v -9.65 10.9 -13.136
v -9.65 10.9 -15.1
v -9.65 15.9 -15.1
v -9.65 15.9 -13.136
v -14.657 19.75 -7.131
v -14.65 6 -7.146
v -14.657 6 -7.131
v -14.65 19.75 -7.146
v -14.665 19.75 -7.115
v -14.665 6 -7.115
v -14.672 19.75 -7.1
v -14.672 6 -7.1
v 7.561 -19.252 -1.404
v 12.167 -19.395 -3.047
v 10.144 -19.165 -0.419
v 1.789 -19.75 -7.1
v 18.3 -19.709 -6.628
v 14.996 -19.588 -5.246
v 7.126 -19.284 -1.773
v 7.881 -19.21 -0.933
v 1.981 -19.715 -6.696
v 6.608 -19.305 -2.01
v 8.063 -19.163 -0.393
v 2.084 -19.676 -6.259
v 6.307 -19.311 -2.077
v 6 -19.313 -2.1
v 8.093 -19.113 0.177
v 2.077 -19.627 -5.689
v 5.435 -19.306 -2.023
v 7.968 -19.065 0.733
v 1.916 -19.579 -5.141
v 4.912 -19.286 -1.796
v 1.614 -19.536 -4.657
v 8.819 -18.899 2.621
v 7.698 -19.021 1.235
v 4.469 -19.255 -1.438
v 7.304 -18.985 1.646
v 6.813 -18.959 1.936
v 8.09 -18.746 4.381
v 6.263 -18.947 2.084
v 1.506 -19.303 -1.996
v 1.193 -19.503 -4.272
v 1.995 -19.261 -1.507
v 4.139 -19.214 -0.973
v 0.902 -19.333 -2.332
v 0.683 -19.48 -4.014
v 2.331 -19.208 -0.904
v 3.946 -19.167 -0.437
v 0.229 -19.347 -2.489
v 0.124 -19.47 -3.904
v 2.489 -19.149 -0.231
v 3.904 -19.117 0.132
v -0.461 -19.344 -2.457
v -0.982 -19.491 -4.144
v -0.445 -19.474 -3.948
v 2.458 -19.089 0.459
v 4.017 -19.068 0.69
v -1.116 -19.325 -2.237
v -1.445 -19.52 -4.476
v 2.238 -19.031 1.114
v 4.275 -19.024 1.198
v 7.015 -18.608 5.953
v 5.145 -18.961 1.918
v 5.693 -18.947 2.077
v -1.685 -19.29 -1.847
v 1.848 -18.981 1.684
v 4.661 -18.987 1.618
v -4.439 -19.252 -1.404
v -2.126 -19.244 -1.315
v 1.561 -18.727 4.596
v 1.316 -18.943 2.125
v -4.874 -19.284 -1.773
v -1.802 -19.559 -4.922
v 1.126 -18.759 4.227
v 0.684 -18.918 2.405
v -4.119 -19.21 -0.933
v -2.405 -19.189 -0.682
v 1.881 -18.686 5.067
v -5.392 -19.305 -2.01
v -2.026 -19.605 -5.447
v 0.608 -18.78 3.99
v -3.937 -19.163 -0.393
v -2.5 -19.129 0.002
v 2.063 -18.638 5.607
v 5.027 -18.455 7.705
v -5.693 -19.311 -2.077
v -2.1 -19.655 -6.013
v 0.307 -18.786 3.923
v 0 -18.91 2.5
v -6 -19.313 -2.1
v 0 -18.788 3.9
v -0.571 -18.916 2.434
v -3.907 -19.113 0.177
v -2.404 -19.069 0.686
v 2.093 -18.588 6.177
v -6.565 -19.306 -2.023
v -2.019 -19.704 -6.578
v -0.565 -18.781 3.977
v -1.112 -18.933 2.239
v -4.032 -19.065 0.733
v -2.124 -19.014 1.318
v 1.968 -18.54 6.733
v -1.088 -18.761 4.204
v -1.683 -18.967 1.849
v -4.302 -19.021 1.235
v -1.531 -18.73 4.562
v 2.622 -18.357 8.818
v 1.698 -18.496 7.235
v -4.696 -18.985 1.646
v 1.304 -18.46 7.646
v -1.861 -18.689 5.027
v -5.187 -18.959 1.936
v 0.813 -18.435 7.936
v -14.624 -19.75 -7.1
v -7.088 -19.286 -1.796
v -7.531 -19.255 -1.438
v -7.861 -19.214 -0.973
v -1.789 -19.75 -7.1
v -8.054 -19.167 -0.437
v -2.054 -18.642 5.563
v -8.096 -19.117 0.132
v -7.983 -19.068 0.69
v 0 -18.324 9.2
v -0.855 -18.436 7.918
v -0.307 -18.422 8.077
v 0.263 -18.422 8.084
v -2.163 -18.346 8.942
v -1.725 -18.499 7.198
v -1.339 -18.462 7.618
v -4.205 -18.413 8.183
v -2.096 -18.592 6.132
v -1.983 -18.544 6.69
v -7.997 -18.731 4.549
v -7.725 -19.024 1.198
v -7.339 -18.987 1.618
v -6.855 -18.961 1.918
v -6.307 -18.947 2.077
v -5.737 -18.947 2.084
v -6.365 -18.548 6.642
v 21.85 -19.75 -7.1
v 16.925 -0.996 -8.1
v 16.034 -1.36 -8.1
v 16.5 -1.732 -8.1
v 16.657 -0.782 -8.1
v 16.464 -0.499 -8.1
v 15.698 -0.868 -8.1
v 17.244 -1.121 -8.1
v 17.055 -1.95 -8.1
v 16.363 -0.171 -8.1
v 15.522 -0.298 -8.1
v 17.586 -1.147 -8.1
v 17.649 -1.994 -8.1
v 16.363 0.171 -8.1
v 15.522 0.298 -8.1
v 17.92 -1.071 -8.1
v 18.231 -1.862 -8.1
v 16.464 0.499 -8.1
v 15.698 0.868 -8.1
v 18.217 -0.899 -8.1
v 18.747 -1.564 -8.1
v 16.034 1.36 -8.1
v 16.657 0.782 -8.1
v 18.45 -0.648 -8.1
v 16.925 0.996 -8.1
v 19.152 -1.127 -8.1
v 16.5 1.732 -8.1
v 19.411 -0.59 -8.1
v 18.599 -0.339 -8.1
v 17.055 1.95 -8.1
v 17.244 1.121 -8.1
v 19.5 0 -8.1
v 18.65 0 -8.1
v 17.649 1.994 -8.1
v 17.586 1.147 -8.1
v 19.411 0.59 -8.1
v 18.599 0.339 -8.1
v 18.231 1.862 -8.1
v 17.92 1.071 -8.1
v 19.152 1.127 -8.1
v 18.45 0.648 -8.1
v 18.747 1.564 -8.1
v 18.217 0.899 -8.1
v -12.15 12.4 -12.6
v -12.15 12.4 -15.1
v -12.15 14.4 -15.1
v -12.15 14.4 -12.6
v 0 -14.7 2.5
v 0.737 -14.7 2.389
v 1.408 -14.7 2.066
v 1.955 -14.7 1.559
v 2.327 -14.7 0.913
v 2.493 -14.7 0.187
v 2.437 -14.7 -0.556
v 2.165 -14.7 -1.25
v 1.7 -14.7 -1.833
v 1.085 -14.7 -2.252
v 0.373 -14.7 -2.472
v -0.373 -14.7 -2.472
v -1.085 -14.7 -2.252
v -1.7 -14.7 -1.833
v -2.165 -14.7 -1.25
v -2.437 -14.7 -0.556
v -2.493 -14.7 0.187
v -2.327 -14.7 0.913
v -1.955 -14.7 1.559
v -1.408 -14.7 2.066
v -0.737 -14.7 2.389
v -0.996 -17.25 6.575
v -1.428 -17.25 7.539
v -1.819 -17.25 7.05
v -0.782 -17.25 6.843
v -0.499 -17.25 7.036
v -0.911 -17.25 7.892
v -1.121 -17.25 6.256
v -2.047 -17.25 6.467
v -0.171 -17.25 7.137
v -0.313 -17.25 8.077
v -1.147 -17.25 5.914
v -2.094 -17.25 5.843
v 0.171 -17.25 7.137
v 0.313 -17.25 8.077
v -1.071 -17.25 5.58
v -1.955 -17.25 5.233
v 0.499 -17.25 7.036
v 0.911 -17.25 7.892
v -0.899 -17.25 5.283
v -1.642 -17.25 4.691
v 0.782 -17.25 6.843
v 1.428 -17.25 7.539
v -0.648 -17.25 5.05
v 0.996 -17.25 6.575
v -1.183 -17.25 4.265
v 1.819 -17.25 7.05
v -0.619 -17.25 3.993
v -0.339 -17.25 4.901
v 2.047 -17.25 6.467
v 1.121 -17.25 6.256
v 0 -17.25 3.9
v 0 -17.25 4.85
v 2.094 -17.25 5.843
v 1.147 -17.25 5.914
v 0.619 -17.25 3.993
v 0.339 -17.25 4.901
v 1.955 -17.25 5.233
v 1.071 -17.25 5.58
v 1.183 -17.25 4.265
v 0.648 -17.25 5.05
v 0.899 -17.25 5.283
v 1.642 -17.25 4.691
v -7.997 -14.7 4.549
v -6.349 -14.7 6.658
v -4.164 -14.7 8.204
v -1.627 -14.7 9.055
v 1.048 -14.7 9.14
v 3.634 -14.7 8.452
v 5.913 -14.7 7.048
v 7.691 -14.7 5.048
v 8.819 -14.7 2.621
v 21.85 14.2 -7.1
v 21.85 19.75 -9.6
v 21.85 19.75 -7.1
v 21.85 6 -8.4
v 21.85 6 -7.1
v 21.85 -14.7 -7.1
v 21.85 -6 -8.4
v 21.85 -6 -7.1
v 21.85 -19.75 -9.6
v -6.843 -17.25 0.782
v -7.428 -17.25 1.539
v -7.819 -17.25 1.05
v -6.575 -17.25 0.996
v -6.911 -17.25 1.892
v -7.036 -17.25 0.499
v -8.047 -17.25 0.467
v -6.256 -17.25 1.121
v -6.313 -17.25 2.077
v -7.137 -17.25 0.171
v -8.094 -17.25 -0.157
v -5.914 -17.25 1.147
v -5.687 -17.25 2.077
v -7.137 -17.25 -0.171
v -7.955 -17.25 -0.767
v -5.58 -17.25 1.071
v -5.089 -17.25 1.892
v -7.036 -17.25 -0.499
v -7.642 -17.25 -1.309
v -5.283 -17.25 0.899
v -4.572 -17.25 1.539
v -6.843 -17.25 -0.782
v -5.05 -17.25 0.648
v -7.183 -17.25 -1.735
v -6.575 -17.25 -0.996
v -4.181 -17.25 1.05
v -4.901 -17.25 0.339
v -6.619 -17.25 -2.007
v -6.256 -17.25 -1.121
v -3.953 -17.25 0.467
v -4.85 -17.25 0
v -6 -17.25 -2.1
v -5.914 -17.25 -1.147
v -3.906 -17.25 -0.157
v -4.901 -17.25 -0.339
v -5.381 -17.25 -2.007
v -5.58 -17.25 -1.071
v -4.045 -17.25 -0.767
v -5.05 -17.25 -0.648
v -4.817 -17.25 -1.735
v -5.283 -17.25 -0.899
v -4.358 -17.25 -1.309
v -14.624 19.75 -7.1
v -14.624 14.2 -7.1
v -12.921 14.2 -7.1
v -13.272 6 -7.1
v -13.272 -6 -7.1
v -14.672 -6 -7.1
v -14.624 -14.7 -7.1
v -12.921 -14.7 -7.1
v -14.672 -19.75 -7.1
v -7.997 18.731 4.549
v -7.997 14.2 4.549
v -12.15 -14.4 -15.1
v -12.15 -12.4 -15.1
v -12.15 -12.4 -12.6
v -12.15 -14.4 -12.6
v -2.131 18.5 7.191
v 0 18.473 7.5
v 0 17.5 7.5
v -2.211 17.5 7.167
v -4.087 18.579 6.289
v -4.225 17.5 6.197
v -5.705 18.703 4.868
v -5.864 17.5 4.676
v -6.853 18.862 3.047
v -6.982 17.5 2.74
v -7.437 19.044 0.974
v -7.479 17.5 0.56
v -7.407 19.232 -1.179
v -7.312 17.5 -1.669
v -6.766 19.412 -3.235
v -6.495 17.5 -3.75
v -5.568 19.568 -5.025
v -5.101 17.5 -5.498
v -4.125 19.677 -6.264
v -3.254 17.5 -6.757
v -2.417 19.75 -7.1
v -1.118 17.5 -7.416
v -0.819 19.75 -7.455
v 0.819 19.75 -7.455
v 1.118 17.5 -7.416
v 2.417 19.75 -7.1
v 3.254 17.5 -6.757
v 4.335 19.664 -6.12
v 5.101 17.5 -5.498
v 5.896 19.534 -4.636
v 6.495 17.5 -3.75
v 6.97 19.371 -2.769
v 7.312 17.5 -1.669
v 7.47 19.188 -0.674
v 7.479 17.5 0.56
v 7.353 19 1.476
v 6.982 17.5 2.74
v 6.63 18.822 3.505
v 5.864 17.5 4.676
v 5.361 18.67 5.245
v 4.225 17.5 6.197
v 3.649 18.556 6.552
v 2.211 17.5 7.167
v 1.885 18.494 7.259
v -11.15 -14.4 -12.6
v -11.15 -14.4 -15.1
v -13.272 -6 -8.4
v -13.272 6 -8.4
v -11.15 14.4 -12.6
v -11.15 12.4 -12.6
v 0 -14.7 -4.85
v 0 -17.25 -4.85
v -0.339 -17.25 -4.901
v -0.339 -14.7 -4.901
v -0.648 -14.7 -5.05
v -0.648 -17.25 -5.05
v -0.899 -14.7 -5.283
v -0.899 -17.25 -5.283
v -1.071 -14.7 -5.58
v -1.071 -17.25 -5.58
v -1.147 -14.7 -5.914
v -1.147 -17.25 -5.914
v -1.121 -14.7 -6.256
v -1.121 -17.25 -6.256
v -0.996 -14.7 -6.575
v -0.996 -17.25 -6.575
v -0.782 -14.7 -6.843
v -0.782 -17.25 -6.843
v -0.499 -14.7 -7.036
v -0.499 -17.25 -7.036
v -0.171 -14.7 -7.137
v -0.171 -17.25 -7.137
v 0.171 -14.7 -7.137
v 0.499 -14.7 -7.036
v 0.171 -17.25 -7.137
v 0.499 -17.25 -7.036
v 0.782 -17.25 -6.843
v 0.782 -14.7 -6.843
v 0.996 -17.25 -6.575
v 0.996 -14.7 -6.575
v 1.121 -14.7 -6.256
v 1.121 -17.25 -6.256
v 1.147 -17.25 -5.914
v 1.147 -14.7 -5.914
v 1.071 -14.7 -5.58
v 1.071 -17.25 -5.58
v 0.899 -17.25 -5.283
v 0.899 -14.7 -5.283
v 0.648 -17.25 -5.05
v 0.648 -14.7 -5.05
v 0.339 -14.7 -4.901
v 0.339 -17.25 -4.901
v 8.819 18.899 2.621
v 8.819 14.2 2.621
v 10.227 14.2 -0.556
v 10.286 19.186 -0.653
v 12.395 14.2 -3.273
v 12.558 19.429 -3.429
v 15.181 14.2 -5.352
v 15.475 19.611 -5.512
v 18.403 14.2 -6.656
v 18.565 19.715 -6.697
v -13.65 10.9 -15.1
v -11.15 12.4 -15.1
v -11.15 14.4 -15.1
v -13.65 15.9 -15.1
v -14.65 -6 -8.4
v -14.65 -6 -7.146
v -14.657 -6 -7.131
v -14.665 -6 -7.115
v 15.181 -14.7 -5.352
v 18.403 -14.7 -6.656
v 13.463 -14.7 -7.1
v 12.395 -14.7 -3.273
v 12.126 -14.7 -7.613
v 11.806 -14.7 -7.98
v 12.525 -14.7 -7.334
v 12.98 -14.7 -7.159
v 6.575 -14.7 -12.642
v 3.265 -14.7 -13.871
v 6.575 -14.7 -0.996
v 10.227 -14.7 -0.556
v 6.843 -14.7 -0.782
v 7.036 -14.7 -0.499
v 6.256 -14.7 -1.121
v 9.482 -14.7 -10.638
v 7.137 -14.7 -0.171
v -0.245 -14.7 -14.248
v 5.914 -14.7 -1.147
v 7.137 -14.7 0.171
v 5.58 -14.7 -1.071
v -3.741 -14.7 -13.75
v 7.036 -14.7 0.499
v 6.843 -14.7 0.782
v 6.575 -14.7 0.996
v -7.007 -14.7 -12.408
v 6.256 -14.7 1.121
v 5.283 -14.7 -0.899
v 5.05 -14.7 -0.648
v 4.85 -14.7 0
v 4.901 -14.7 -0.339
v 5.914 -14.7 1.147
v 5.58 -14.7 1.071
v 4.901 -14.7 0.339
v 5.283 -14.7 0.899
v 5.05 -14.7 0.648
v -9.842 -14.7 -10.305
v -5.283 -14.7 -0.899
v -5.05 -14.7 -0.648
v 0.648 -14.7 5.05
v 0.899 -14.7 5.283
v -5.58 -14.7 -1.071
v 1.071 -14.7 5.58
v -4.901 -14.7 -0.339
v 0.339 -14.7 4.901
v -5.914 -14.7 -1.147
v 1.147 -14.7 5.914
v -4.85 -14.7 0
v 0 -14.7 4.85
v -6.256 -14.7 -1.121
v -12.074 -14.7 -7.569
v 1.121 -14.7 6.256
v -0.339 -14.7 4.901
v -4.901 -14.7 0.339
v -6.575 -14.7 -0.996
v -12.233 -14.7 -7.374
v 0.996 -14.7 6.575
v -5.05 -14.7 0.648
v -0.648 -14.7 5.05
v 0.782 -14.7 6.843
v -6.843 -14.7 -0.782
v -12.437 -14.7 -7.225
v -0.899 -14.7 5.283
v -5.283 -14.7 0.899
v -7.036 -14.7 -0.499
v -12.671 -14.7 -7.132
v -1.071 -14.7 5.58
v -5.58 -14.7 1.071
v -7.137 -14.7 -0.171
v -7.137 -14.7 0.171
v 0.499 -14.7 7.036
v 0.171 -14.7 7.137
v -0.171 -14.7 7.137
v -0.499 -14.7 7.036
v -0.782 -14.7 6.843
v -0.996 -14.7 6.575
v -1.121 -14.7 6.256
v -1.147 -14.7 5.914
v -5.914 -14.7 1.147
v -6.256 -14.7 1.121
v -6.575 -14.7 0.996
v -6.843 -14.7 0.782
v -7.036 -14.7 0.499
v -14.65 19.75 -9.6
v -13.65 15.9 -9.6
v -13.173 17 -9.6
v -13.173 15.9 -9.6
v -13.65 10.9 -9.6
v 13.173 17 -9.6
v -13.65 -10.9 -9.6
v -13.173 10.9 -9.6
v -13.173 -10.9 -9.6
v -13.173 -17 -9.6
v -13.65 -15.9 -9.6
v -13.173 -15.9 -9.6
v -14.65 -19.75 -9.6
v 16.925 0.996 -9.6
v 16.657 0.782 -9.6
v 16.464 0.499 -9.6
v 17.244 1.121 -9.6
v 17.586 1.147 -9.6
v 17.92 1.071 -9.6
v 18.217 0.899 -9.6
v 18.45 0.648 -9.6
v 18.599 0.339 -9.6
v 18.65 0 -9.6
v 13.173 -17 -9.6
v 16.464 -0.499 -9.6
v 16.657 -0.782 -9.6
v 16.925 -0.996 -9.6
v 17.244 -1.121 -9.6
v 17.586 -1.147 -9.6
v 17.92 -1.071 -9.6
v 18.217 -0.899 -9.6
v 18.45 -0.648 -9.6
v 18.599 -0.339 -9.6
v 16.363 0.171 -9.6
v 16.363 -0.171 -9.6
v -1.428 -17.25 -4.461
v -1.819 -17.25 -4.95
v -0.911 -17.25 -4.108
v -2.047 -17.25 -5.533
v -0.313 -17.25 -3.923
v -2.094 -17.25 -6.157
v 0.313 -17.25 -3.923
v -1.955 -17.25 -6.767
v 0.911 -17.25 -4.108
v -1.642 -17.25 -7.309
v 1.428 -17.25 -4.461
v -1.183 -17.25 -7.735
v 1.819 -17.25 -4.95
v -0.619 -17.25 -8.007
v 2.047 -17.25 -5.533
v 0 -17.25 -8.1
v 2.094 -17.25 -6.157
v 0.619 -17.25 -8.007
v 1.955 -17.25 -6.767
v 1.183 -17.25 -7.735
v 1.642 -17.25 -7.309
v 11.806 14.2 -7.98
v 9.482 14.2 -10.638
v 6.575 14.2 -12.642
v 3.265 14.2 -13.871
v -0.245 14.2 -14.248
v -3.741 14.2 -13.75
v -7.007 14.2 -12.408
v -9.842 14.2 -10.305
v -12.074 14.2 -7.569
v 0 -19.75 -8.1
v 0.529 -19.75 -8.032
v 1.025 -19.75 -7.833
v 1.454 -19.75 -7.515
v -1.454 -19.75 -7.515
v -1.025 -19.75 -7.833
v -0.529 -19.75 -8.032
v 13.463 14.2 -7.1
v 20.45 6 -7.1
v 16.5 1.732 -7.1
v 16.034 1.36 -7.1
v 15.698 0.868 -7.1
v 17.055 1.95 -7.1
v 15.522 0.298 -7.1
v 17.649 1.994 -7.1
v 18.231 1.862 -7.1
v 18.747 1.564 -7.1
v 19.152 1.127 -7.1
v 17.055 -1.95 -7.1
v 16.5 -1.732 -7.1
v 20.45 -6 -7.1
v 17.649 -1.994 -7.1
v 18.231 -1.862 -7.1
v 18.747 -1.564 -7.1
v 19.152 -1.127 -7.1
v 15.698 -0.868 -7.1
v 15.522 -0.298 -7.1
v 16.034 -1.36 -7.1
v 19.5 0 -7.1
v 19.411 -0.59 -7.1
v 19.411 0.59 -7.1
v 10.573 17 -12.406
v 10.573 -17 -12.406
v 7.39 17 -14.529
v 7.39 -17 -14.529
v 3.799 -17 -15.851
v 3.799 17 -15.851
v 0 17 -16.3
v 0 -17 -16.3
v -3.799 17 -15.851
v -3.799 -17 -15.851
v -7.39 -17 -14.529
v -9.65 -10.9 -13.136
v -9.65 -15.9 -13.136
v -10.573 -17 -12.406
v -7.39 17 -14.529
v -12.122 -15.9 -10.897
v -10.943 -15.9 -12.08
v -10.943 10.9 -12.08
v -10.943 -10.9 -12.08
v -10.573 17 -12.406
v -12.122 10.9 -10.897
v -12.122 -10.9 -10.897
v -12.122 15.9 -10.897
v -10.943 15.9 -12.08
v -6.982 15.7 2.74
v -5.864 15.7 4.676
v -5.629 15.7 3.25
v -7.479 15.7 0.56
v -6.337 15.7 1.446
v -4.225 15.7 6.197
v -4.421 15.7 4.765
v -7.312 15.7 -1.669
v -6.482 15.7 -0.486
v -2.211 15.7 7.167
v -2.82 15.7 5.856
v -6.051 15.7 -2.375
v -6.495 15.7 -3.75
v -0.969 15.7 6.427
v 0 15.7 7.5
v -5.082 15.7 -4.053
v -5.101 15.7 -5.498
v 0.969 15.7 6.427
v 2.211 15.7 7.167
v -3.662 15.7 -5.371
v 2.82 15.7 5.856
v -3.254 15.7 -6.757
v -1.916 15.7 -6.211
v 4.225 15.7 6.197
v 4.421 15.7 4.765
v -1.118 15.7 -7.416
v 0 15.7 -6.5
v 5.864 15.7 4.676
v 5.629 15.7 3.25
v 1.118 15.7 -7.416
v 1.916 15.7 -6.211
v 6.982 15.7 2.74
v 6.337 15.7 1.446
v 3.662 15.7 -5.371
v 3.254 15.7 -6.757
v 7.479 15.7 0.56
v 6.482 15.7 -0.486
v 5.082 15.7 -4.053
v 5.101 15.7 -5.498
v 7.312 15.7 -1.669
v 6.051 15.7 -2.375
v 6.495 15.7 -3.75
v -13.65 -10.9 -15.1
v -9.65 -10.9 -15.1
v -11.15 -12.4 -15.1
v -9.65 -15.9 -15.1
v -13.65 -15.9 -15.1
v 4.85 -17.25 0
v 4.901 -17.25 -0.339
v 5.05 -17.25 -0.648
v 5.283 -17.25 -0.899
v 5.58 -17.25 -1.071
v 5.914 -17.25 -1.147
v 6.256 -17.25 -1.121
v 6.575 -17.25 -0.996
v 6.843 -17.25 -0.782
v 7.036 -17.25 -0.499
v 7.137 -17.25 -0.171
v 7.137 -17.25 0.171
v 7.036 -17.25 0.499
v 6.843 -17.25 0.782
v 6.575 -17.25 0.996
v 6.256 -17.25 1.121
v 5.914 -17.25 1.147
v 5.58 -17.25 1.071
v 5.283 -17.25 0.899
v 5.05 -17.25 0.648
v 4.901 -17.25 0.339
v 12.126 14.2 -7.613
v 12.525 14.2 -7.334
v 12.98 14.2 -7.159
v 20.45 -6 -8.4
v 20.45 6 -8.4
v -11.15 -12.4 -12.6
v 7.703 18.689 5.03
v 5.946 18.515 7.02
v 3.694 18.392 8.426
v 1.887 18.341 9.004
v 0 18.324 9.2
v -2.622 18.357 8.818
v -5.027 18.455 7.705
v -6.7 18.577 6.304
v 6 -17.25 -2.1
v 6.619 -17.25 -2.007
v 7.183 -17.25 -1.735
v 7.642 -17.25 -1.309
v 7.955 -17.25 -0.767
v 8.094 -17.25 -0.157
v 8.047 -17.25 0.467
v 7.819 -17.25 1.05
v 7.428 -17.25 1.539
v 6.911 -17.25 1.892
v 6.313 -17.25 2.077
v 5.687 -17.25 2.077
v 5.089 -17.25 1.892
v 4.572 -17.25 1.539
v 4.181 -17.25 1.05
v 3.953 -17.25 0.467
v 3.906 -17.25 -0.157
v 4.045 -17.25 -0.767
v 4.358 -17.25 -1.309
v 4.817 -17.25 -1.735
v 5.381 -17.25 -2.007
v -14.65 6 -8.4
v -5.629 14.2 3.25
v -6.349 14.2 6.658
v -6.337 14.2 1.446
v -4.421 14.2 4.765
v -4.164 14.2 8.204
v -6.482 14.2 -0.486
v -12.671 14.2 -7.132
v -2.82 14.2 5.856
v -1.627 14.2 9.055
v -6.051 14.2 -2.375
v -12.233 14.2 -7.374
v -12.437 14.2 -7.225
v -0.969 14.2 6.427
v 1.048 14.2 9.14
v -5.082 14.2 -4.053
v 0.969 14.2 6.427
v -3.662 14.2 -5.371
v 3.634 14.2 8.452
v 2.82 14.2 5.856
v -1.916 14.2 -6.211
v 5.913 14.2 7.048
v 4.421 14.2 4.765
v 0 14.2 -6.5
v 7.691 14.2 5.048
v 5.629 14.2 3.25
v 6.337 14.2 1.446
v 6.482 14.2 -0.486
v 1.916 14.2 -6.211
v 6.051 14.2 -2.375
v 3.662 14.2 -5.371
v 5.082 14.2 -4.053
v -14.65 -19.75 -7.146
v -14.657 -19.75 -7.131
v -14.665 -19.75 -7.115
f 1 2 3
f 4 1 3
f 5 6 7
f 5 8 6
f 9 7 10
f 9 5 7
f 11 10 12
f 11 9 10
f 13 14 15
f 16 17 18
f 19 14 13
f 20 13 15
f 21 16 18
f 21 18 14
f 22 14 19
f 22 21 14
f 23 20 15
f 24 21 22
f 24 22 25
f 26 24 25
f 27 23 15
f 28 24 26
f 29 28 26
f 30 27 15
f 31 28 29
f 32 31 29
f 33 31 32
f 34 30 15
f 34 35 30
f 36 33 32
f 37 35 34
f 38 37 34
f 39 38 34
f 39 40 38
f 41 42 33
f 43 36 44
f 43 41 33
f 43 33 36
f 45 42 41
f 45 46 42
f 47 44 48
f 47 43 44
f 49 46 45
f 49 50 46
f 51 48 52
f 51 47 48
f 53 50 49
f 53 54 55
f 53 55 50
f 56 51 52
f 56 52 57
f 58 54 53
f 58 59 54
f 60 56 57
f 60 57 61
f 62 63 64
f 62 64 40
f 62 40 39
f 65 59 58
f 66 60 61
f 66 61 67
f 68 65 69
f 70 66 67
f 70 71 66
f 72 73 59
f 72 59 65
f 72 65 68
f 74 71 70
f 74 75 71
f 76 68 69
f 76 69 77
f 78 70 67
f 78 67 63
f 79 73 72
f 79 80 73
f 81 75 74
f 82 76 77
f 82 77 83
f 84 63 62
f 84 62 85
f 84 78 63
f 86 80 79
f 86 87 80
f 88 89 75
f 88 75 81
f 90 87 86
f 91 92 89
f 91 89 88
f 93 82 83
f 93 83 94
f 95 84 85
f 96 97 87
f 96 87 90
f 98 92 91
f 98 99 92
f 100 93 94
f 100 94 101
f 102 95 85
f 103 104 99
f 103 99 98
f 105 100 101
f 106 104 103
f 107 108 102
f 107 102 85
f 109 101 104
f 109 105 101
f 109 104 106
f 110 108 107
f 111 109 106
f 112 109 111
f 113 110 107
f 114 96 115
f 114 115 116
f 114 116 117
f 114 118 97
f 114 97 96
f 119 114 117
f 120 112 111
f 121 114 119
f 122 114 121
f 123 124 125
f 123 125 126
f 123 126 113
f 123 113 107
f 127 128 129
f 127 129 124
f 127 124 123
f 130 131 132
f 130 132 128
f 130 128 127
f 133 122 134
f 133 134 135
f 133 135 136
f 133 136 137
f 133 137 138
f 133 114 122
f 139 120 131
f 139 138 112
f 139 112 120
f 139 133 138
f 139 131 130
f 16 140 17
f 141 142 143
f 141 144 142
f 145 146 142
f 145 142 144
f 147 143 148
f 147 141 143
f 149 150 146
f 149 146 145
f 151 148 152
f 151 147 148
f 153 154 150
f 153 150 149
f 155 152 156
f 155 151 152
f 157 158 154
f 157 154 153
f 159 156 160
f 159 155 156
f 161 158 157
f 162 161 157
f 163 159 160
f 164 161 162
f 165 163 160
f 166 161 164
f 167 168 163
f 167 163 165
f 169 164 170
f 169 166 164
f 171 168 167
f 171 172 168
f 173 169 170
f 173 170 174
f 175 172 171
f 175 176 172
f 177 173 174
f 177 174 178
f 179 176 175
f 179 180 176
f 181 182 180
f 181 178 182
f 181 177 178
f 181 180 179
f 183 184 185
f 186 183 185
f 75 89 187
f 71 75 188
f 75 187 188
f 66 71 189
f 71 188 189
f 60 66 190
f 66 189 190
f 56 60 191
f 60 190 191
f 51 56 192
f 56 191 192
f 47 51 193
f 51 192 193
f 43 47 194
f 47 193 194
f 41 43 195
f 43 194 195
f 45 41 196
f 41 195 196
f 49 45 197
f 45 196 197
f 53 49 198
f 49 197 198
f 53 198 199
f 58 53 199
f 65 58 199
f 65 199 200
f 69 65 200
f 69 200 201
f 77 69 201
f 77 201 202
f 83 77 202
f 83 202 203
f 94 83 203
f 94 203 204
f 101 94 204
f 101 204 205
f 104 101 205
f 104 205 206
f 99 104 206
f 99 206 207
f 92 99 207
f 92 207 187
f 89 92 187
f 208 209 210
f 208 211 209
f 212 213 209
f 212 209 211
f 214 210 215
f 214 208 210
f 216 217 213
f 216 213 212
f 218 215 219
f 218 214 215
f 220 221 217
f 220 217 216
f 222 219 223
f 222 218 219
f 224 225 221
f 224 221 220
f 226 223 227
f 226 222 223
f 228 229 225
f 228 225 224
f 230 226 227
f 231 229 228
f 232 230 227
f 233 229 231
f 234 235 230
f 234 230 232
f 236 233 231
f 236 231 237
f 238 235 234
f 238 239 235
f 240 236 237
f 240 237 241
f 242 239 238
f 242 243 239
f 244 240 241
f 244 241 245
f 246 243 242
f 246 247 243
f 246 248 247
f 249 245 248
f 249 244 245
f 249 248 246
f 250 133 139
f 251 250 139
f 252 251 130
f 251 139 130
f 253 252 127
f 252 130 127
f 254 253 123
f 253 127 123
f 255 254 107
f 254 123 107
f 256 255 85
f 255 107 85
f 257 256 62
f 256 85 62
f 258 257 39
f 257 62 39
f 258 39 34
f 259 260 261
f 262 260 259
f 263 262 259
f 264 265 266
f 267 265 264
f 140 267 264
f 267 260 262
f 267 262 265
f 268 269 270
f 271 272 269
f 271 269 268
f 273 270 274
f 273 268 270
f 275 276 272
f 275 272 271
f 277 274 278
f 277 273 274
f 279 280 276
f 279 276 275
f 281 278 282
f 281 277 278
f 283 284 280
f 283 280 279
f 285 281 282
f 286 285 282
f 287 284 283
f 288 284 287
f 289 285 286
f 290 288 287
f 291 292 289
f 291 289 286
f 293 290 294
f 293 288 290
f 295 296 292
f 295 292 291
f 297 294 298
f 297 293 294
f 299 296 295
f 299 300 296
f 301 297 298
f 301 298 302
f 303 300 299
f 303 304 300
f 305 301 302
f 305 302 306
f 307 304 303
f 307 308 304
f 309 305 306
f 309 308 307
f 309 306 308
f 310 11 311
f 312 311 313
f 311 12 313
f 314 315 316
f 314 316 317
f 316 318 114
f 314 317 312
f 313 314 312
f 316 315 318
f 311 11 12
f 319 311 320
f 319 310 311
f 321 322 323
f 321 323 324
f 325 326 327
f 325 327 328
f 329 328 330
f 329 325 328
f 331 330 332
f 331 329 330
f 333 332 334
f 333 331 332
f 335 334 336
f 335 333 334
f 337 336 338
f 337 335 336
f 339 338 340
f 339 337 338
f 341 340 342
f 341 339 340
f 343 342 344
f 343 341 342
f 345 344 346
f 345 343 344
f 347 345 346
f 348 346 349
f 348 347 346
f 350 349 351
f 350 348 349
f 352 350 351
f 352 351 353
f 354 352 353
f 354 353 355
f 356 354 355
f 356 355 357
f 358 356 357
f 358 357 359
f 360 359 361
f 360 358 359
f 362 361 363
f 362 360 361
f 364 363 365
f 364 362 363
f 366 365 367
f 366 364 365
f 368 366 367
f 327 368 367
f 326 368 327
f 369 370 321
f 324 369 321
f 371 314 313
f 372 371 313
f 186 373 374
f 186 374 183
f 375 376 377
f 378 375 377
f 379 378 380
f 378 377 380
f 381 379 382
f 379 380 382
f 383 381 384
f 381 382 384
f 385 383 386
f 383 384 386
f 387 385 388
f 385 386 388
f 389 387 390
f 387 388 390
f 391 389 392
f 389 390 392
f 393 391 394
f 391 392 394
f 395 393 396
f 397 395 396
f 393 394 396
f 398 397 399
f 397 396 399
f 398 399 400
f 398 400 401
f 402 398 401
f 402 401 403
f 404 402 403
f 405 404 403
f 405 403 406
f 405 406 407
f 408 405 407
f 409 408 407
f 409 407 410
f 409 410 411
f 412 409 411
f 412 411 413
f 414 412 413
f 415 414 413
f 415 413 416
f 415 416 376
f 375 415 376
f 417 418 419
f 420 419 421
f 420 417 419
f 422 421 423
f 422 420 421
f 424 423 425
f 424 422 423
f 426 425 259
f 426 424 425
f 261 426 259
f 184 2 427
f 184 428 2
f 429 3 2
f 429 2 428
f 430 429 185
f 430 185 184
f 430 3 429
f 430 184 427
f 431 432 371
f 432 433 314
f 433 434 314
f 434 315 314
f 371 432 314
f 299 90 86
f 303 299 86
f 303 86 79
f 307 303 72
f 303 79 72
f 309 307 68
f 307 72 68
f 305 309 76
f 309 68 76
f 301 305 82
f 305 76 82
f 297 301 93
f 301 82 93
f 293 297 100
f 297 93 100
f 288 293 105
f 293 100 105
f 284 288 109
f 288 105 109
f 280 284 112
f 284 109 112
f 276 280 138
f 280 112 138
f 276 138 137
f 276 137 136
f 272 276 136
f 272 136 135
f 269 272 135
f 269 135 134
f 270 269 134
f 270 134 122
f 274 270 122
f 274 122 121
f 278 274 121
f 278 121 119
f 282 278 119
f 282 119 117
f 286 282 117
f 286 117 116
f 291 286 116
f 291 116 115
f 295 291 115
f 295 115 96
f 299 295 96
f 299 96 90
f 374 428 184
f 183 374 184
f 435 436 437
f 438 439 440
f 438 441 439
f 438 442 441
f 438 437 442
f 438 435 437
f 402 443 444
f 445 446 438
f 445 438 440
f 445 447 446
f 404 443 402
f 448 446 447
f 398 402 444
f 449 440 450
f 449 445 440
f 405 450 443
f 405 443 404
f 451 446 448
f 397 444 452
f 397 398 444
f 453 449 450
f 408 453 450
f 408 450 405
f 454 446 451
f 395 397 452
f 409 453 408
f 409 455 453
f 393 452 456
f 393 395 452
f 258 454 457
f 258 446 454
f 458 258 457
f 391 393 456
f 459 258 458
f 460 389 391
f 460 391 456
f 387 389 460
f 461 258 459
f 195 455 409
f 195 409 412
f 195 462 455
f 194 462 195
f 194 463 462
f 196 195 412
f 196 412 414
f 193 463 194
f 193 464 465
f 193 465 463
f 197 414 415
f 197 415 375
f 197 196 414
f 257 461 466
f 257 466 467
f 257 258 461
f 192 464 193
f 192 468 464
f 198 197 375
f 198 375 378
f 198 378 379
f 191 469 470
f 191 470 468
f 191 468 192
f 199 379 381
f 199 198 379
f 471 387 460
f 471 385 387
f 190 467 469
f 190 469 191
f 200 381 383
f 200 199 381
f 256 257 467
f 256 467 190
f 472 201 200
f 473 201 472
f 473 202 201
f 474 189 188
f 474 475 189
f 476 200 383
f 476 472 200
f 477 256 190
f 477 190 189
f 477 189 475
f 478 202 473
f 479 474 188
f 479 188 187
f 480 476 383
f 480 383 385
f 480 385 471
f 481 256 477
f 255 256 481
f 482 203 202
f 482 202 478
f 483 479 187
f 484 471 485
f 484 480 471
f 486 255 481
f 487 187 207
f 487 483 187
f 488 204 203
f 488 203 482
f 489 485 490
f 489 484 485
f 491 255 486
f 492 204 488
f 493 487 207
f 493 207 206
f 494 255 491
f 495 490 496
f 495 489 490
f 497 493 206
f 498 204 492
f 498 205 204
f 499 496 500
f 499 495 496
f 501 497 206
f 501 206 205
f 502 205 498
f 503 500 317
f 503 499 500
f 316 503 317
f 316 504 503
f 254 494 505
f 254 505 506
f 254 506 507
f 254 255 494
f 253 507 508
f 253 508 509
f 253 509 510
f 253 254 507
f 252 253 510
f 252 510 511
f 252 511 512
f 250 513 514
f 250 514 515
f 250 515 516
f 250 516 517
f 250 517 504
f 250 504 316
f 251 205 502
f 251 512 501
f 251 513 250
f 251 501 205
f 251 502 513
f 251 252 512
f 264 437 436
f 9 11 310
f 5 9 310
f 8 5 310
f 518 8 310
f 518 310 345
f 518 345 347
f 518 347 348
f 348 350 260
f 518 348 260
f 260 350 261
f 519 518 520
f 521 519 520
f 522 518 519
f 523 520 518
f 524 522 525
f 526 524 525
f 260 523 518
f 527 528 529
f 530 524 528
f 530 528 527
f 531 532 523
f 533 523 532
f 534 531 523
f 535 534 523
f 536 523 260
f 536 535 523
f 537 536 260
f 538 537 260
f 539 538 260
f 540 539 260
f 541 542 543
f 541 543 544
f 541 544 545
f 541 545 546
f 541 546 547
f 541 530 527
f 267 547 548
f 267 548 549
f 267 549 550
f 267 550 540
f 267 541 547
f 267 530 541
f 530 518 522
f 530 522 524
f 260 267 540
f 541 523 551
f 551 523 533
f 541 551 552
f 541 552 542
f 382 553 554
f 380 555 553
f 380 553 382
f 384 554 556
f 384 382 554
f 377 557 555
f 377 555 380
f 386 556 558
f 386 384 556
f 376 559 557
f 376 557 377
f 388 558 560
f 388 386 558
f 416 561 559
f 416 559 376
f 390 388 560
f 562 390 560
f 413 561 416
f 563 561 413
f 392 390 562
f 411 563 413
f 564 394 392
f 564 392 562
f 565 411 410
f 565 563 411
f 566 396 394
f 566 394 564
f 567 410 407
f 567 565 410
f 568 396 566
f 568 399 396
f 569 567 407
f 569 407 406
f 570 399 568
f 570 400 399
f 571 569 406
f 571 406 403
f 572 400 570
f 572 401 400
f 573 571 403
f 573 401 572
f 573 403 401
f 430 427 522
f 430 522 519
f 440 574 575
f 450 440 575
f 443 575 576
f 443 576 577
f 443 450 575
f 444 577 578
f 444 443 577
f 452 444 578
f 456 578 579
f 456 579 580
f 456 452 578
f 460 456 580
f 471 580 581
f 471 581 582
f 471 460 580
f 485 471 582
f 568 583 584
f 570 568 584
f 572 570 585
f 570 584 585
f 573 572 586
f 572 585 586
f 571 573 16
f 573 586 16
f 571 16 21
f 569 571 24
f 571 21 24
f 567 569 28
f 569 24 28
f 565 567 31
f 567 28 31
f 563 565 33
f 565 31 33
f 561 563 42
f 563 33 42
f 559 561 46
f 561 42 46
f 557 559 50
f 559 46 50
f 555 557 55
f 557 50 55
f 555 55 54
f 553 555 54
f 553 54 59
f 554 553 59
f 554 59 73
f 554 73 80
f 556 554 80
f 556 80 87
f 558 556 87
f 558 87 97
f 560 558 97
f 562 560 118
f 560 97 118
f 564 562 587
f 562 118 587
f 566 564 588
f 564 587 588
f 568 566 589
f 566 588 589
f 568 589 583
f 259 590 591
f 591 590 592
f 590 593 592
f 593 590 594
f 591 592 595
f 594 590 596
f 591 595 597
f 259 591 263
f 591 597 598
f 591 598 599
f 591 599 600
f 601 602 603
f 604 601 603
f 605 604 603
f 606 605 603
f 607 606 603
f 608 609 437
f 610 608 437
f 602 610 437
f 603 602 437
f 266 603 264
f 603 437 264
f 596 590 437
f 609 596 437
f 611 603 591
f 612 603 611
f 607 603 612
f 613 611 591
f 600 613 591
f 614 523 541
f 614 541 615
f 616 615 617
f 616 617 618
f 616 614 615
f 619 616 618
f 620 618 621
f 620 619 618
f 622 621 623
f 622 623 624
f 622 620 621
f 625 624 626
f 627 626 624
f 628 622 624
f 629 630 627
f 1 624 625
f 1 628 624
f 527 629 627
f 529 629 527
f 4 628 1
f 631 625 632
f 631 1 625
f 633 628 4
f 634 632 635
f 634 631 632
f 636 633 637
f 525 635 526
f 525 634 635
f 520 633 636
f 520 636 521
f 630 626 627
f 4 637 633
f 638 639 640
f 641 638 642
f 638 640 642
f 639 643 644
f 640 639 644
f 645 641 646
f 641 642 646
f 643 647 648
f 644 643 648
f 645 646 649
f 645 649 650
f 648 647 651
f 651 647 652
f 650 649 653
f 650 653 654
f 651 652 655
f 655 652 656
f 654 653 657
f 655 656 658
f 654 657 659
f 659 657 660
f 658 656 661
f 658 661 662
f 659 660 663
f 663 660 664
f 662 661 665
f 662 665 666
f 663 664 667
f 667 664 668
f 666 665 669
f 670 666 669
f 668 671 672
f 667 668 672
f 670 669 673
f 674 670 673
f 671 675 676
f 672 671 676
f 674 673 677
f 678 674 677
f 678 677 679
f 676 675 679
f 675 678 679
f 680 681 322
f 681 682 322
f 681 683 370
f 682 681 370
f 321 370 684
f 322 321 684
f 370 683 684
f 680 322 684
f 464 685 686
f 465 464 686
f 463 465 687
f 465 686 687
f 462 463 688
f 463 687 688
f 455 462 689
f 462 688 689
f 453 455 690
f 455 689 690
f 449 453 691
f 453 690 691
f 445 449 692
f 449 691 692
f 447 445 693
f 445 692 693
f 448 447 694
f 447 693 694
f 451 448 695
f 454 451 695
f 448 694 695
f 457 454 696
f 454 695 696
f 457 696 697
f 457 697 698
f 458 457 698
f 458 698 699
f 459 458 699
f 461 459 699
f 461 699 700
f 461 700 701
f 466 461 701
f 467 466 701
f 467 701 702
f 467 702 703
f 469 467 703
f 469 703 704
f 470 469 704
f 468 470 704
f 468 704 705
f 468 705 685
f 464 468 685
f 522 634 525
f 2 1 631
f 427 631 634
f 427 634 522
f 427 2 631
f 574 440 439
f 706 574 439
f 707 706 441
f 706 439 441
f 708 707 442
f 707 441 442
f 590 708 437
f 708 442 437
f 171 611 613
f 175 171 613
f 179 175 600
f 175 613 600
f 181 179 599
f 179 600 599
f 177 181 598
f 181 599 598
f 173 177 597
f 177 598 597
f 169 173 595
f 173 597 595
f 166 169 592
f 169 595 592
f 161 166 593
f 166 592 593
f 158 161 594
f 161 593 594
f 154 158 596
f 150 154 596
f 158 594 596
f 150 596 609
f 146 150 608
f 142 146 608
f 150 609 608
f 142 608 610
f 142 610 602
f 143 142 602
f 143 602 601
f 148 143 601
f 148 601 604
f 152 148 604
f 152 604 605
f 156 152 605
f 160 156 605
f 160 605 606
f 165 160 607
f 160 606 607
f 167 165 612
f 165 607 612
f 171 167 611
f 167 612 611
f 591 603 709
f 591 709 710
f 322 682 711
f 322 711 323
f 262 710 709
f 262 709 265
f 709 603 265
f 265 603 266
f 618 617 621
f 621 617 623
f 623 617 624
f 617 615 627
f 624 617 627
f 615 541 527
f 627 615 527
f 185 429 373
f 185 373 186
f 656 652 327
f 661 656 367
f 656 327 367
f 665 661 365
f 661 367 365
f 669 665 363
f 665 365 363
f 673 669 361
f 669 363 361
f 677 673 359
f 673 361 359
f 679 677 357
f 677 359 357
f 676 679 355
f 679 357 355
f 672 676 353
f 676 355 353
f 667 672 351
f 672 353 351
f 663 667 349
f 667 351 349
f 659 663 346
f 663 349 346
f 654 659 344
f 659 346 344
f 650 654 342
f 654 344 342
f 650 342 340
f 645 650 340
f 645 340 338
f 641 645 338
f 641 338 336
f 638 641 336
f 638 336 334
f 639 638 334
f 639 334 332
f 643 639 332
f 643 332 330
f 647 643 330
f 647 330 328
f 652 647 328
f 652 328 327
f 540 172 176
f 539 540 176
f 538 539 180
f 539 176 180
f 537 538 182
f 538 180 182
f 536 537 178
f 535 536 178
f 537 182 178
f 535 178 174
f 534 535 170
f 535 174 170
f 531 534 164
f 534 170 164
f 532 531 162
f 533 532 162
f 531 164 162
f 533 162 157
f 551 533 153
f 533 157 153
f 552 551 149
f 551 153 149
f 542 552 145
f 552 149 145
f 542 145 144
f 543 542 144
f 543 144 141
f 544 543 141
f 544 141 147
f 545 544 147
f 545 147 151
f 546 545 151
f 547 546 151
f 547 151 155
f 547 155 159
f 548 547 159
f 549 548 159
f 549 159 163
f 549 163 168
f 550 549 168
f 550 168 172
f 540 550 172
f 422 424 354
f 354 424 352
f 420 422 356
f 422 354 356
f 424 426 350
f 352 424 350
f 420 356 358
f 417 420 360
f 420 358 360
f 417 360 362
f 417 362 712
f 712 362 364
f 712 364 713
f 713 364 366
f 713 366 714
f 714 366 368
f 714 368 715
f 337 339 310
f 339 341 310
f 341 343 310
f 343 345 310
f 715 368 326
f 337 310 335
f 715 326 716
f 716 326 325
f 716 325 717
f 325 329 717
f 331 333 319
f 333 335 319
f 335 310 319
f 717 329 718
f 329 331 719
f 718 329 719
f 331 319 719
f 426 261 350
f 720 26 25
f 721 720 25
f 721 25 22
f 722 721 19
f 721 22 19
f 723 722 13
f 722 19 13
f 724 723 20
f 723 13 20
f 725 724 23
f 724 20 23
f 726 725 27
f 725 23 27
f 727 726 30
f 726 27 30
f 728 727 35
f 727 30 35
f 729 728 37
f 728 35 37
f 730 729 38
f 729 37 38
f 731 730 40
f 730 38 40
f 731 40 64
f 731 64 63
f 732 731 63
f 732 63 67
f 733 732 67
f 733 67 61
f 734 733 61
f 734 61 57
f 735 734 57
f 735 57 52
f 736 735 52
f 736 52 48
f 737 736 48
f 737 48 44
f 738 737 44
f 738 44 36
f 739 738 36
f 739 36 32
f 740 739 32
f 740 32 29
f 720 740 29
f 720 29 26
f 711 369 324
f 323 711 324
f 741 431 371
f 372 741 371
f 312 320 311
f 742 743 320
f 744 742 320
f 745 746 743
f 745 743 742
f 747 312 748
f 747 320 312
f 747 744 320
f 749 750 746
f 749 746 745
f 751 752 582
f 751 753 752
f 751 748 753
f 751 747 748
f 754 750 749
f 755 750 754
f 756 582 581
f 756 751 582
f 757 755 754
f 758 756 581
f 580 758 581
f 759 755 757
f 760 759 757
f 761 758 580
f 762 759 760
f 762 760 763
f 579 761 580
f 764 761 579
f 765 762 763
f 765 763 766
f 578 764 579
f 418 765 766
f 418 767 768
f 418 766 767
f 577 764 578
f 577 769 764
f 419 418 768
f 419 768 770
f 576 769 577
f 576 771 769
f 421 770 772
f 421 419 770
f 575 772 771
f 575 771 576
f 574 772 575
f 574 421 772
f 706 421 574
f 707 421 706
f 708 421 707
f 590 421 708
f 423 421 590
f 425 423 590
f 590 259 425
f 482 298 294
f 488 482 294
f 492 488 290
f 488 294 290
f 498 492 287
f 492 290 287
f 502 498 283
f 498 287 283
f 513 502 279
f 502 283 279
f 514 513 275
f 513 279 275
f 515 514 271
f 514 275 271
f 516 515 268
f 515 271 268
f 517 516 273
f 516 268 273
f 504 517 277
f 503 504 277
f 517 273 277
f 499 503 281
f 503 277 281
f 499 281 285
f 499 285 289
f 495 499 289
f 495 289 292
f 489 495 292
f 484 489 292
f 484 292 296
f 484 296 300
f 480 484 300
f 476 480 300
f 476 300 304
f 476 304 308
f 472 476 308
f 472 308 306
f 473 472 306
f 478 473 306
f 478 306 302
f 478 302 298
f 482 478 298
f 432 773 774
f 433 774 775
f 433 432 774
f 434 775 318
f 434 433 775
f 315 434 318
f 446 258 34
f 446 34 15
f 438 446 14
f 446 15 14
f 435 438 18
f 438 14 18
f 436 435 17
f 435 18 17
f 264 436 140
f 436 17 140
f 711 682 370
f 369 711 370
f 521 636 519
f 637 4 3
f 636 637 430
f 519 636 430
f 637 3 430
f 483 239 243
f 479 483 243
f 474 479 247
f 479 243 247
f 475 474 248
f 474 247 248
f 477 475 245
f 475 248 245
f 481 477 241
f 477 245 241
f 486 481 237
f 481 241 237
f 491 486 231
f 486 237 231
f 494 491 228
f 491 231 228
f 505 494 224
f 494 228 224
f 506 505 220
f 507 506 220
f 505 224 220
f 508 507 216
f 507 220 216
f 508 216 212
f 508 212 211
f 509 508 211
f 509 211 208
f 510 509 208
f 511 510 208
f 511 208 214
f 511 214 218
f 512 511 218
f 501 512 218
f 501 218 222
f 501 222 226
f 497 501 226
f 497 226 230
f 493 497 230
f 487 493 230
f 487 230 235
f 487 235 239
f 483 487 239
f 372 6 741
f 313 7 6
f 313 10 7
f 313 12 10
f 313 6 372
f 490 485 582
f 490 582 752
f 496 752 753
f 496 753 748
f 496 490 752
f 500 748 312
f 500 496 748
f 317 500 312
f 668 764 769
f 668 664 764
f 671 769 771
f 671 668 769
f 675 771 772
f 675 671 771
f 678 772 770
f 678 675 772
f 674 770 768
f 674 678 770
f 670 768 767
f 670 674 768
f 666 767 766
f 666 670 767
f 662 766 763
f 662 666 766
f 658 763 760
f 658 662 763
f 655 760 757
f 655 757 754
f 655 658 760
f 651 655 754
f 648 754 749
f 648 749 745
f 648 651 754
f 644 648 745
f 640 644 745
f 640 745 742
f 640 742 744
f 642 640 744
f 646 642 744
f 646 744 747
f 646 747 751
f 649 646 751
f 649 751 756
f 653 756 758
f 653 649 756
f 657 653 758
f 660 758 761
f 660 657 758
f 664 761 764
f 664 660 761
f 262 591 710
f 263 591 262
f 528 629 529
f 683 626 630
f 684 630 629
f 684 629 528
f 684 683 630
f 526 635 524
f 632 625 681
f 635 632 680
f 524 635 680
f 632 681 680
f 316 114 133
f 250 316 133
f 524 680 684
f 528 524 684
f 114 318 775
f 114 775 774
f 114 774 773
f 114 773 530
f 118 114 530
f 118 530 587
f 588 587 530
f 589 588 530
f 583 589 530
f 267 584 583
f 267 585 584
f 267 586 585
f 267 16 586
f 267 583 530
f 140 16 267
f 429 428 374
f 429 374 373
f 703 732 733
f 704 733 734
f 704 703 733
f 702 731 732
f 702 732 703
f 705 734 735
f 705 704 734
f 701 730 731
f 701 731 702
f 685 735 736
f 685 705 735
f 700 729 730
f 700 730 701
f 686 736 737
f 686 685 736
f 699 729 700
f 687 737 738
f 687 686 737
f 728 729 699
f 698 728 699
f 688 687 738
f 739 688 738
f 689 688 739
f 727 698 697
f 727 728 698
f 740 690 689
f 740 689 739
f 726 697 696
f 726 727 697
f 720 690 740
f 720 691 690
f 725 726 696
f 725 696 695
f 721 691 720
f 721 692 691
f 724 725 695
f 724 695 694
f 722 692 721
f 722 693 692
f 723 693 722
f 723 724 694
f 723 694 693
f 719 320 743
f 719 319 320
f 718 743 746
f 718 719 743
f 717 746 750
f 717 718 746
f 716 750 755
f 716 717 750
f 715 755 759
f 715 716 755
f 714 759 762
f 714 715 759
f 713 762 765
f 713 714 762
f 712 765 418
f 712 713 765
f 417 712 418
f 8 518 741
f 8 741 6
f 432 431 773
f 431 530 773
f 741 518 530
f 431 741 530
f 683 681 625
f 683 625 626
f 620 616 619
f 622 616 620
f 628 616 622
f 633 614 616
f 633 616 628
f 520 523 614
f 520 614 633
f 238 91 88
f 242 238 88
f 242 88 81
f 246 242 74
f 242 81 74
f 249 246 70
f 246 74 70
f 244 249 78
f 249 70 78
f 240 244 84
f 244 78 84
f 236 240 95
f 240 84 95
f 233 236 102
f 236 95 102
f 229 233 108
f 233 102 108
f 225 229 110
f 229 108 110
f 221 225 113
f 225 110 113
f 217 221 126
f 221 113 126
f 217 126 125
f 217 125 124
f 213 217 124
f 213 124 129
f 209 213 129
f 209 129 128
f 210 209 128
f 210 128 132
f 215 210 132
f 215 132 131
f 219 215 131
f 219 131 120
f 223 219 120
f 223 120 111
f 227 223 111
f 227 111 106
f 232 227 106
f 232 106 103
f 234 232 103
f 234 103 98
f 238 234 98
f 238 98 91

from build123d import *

# Parameters (mm, degrees)
SKETCH_1_R               = 16.3
EXTRUDE_1_DEPTH          = 19.75
SKETCH_2_W               = 36.5
SKETCH_2_H               = 2.5
EXTRUDE_2_DEPTH          = 39.5
SKETCH_3_W               = 44.844436064
SKETCH_3_H               = 25.506740045
CUT_EXTRUDE_1_DEPTH      = 50
EXTRUDE_3_DEPTH          = 5.05
SKETCH_5_R               = 14.25
CUT_EXTRUDE_2_DEPTH      = 29.4
SKETCH_6_R               = 2.5
CUT_EXTRUDE_3_DEPTH      = 44.930797853
CUT_EXTRUDE_6_REACH      = 49.993
SKETCH_9_R               = 7.5
SKETCH_12_R              = 1.15
CUT_EXTRUDE_9_DEPTH      = 34.662664779
SKETCH_13_R              = 2
CUT_EXTRUDE_10_DEPTH     = 1
SKETCH_14_W              = 2.8
SKETCH_14_H              = 12
CUT_EXTRUDE_11_DEPTH     = 1.3
SKETCH_15_W              = 2.8
SKETCH_15_H              = 12
CUT_EXTRUDE_12_DEPTH     = 1.3
EXTRUDE_5_REACH          = 40.183
EXTRUDE_5_END_RADIUS     = 16.3
SKETCH_16_W              = 4
SKETCH_16_H              = 5
SKETCH_17_W              = 1
SKETCH_17_H              = 2
CUT_EXTRUDE_13_DEPTH     = 2.5
SKETCH_19_R              = 8.51898124
SKETCH_19_R_2            = 6.5
EXTRUDE_6_DEPTH          = 2.25
CUT_EXTRUDE_18_REACH     = 49.993
SKETCH_20_R              = 1.15
PATTERN_CIRCULAR_1_COUNT = 4
CUT_EXTRUDE_8_DEPTH      = 45.587021654
SKETCH_18_W              = 26.346157216
SKETCH_18_H              = 2.75
CUT_EXTRUDE_16_DEPTH     = 12.5
FILLET_1_R               = 2
FILLET_2_R               = 1
SKETCH_21_R              = 2.1
CUT_EXTRUDE_19_DEPTH     = 2.5
CUT_EXTRUDE_START        = -10
SKETCH_22_R              = 7.5
CUT_EXTRUDE_23_DEPTH     = 10
EXTRUDE_START            = -1
SKETCH_23_R              = 7.5
SKETCH_23_R_2            = 6.5
EXTRUDE_7_DEPTH          = 1
MOVE_FACE_3_BY           = 0.5


with BuildPart() as part:
    # 草图1 → 凸台-拉伸1 (new, symmetric)
    with BuildSketch(Plane(origin=(0, 0, 0), x_dir=(1, 0, 0), z_dir=(0, 1, 0))):
        with Locations(Location((0, 0, 0), (0, 0, 270))):
            Circle(SKETCH_1_R)
    extrude(amount=EXTRUDE_1_DEPTH, both=True)

    # 草图2 → 凸台-拉伸2 (add, through all)
    with BuildSketch(Plane.XZ.offset(19.75)):
        with Locations((3.6, -8.35)):
            Rectangle(SKETCH_2_W, SKETCH_2_H)
    extrude(amount=-EXTRUDE_2_DEPTH)

    # 草图3 → 切除-拉伸1 (cut)
    with BuildSketch(Plane.XZ.offset(19.75)):
        with Locations((-0.572218032, 5.653370022)):
            Rectangle(SKETCH_3_W, SKETCH_3_H)
    extrude(amount=-CUT_EXTRUDE_1_DEPTH, mode=Mode.SUBTRACT)

    # 草图4 → 凸台-拉伸3 (add)
    with BuildSketch(Plane.XZ.offset(19.75)):
        with BuildLine():
            Line((-14.65, -7.146152811), (-7.996542478, 4.549209646))
            ThreePointArc((-7.996542478, 4.549209646), (1.047927533, 9.140122969), (8.818653972, 2.621324497))
            ThreePointArc((8.818653972, 2.621324497), (13.721037439, -4.401937543), (21.85, -7.1))
            Line((21.85, -7.1), (-14.65, -7.146152811))
        make_face()
    extrude_3 = extrude(amount=-EXTRUDE_3_DEPTH)

    # 镜向1: 凸台-拉伸3 across plane
    add(extrude_3.mirror(Plane.ZX))

    # 草图5 → 切除-拉伸2 (cut)
    with BuildSketch(Plane(origin=(0, -14.7, 0), x_dir=(1, 0, 0), z_dir=(0, 1, 0))):
        Circle(SKETCH_5_R)
    extrude(amount=CUT_EXTRUDE_2_DEPTH, mode=Mode.SUBTRACT)

    # 草图6 → 切除-拉伸3 (cut, through all)
    with BuildSketch(Plane(origin=(0, -14.7, 0), x_dir=(1, 0, 0), z_dir=(0, 1, 0))):
        with Locations(Location((0, 0, 0), (0, 0, 270))):
            Circle(SKETCH_6_R)
    extrude(amount=-CUT_EXTRUDE_3_DEPTH, mode=Mode.SUBTRACT)

    # 草图9 → 切除-拉伸6 (cut, up to next)
    with BuildSketch(Plane(origin=(0, 19.75, 0), x_dir=(1, 0, 0), z_dir=(0, 1, 0)), mode=Mode.PRIVATE) as cut_extrude_6_sk1:
        with Locations(Location((0, 0, 0), (0, 0, 270))):
            Circle(SKETCH_9_R)
    cut_extrude_6_tool1 = extrude(cut_extrude_6_sk1.sketch, amount=-CUT_EXTRUDE_6_REACH, mode=Mode.PRIVATE) & part.part
    add(cut_extrude_6_tool1.solids().sort_by_distance((0, 19.75, 0))[0], mode=Mode.SUBTRACT)

    # 草图12 → 切除-拉伸9 (cut, through all)
    with BuildSketch(Plane.XY.offset(-7.1)):
        with Locations((17.5, 0)):
            Circle(SKETCH_12_R)
    extrude(amount=-CUT_EXTRUDE_9_DEPTH, mode=Mode.SUBTRACT)

    # 草图13 → 切除-拉伸10 (cut)
    with BuildSketch(Plane.XY.offset(-7.1)):
        with Locations((17.5, 0)):
            Circle(SKETCH_13_R)
    extrude(amount=-CUT_EXTRUDE_10_DEPTH, mode=Mode.SUBTRACT)

    # 草图14 → 切除-拉伸11 (cut)
    with BuildSketch(Plane.XY.offset(-7.1)):
        with Locations((21.85, 0)):
            Rectangle(SKETCH_14_W, SKETCH_14_H)
    extrude(amount=-CUT_EXTRUDE_11_DEPTH, mode=Mode.SUBTRACT)

    # 草图15 → 切除-拉伸12 (cut)
    with BuildSketch(Plane.XY.offset(-7.1)):
        with Locations((-14.672423113, 0)):
            Rectangle(SKETCH_15_W, SKETCH_15_H)
    extrude(amount=-CUT_EXTRUDE_12_DEPTH, mode=Mode.SUBTRACT)

    # 凸台-拉伸5: up to this cylinder (the profile starts outside it)
    extrude_5_end = Plane(origin=(0, 13.4, 0), z_dir=(0, -1, 0)) * Cylinder(EXTRUDE_5_END_RADIUS, 113.966, mode=Mode.PRIVATE)
    # 草图16 → 凸台-拉伸5 (add, up to the surface)
    with BuildSketch(Plane(origin=(0, 0, -15.1), x_dir=(-1, 0, 0), z_dir=(0, 0, -1)), mode=Mode.PRIVATE) as extrude_5_sk1:
        with Locations((11.65, 13.4)):
            Rectangle(SKETCH_16_W, SKETCH_16_H)
    extrude_5_tool1 = extrude(extrude_5_sk1.sketch, amount=-EXTRUDE_5_REACH, mode=Mode.PRIVATE) - extrude_5_end
    extrude_5 = extrude_5_tool1.solids().sort_by_distance((-11.65, 13.4, -15.1))[0]
    add(extrude_5)

    # 镜向4: 凸台-拉伸5 across plane
    add(extrude_5.mirror(Plane.ZX))

    # 草图17 → 切除-拉伸13 (cut)
    with BuildSketch(Plane(origin=(0, 0, -15.1), x_dir=(-1, 0, 0), z_dir=(0, 0, -1))):
        with Locations((11.65, 13.4)):
            Rectangle(SKETCH_17_W, SKETCH_17_H)
    cut_extrude_13 = extrude(amount=-CUT_EXTRUDE_13_DEPTH, mode=Mode.SUBTRACT)

    # 镜向5: 切除-拉伸13 across plane
    add(cut_extrude_13.mirror(Plane.ZX), mode=Mode.SUBTRACT)

    # 草图19 → 凸台-拉伸6 (add)
    with BuildSketch(Plane(origin=(0, 19.75, 0), x_dir=(1, 0, 0), z_dir=(0, 1, 0))):
        Circle(SKETCH_19_R)
        with Locations(Location((0, 0, 0), (0, 0, 270))):
            Circle(SKETCH_19_R_2, mode=Mode.SUBTRACT)
    extrude(amount=-EXTRUDE_6_DEPTH)

    # 草图20 → 切除-拉伸18 (cut, up to next)
    with BuildSketch(Plane.XZ.offset(19.75), mode=Mode.PRIVATE) as cut_extrude_18_sk1:
        with Locations(Location((0, 6, 0), (0, 0, 270))):
            Circle(SKETCH_20_R)
    cut_extrude_18_tool1 = extrude(cut_extrude_18_sk1.sketch, amount=-CUT_EXTRUDE_18_REACH, mode=Mode.PRIVATE) & part.part
    cut_extrude_18 = cut_extrude_18_tool1.solids().sort_by_distance((0, -19.75, 6))[0]
    add(cut_extrude_18, mode=Mode.SUBTRACT)

    # 阵列(圆周)1: 切除-拉伸18 ×4 about axis
    pattern_circular_1_axis = Axis((0, 0, 0), (0, 1, 0))
    for i in range(1, PATTERN_CIRCULAR_1_COUNT):
        add(cut_extrude_18.rotate(pattern_circular_1_axis, i * 360 / PATTERN_CIRCULAR_1_COUNT), mode=Mode.SUBTRACT)

    # 草图7 → 切除-拉伸8 (cut, through all)
    with BuildSketch(Plane.ZY.offset(14.65)):
        Polygon((-7.1, 19.75), (9.2, 18.323934785), (9.2, 19.75), align=None)
    cut_extrude_8 = extrude(amount=-CUT_EXTRUDE_8_DEPTH, mode=Mode.SUBTRACT)

    # 镜向3: 切除-拉伸8 across plane
    add(cut_extrude_8.mirror(Plane.ZX), mode=Mode.SUBTRACT)

    # 草图18 → 切除-拉伸16 (cut)
    with BuildSketch(Plane(origin=(0, 0, -9.6), x_dir=(-1, 0, 0), z_dir=(0, 0, -1))):
        with Locations((0, 18.375)):
            Rectangle(SKETCH_18_W, SKETCH_18_H)
    cut_extrude_16 = extrude(amount=CUT_EXTRUDE_16_DEPTH, mode=Mode.SUBTRACT)

    # 镜向6: 切除-拉伸16 across plane
    add(cut_extrude_16.mirror(Plane.ZX), mode=Mode.SUBTRACT)

    # 圆角1
    fillet_1_edges = [part.edges().sort_by_distance(p)[0] for p in [
        (12.355262037, 0, -7.1),
    ]]
    fillet(fillet_1_edges, radius=FILLET_1_R)

    # 圆角2
    fillet_2_edges = [part.edges().sort_by_distance(p)[0] for p in [
        (-12.355262037, 0, -7.1),
    ]]
    fillet(fillet_2_edges, radius=FILLET_2_R)

    # 草图21 → 切除-拉伸19 (cut)
    with BuildSketch(Plane.XZ.offset(19.75)):
        with Locations(Location((0, 6, 0), (0, 0, 270))):
            Circle(SKETCH_21_R)
        with Locations(Location((-6, 0, 0), (0, 0, 270))):
            Circle(SKETCH_21_R)
        with Locations(Location((6, 0, 0), (0, 0, 270))):
            Circle(SKETCH_21_R)
        with Locations(Location((0, -6, 0), (0, 0, 270))):
            Circle(SKETCH_21_R)
    extrude(amount=-CUT_EXTRUDE_19_DEPTH, mode=Mode.SUBTRACT)

    # 草图22 → 切除-拉伸23 (cut)
    with BuildSketch(Plane.XZ.offset(-17.5).offset(CUT_EXTRUDE_START)):
        with Locations(Location((0, 0, 0), (0, 0, 90))):
            Circle(SKETCH_22_R)
    extrude(amount=CUT_EXTRUDE_23_DEPTH, mode=Mode.SUBTRACT)

    # 草图23 → 凸台-拉伸7 (add)
    with BuildSketch(Plane.XZ.offset(-14.7).offset(EXTRUDE_START)):
        with Locations(Location((0, 0, 0), (0, 0, 288.796905035))):
            Circle(SKETCH_23_R)
        with Locations(Location((0, 0, 0), (0, 0, 270))):
            Circle(SKETCH_23_R_2, mode=Mode.SUBTRACT)
    extrude(amount=EXTRUDE_7_DEPTH)

    # Move Face 3: a face moved outward by 0.5
    extrude(part.faces().sort_by_distance((3.6131281, 14.7, -8.3875))[0], amount=MOVE_FACE_3_BY, dir=(0, -1, 0))


solid = part.part
